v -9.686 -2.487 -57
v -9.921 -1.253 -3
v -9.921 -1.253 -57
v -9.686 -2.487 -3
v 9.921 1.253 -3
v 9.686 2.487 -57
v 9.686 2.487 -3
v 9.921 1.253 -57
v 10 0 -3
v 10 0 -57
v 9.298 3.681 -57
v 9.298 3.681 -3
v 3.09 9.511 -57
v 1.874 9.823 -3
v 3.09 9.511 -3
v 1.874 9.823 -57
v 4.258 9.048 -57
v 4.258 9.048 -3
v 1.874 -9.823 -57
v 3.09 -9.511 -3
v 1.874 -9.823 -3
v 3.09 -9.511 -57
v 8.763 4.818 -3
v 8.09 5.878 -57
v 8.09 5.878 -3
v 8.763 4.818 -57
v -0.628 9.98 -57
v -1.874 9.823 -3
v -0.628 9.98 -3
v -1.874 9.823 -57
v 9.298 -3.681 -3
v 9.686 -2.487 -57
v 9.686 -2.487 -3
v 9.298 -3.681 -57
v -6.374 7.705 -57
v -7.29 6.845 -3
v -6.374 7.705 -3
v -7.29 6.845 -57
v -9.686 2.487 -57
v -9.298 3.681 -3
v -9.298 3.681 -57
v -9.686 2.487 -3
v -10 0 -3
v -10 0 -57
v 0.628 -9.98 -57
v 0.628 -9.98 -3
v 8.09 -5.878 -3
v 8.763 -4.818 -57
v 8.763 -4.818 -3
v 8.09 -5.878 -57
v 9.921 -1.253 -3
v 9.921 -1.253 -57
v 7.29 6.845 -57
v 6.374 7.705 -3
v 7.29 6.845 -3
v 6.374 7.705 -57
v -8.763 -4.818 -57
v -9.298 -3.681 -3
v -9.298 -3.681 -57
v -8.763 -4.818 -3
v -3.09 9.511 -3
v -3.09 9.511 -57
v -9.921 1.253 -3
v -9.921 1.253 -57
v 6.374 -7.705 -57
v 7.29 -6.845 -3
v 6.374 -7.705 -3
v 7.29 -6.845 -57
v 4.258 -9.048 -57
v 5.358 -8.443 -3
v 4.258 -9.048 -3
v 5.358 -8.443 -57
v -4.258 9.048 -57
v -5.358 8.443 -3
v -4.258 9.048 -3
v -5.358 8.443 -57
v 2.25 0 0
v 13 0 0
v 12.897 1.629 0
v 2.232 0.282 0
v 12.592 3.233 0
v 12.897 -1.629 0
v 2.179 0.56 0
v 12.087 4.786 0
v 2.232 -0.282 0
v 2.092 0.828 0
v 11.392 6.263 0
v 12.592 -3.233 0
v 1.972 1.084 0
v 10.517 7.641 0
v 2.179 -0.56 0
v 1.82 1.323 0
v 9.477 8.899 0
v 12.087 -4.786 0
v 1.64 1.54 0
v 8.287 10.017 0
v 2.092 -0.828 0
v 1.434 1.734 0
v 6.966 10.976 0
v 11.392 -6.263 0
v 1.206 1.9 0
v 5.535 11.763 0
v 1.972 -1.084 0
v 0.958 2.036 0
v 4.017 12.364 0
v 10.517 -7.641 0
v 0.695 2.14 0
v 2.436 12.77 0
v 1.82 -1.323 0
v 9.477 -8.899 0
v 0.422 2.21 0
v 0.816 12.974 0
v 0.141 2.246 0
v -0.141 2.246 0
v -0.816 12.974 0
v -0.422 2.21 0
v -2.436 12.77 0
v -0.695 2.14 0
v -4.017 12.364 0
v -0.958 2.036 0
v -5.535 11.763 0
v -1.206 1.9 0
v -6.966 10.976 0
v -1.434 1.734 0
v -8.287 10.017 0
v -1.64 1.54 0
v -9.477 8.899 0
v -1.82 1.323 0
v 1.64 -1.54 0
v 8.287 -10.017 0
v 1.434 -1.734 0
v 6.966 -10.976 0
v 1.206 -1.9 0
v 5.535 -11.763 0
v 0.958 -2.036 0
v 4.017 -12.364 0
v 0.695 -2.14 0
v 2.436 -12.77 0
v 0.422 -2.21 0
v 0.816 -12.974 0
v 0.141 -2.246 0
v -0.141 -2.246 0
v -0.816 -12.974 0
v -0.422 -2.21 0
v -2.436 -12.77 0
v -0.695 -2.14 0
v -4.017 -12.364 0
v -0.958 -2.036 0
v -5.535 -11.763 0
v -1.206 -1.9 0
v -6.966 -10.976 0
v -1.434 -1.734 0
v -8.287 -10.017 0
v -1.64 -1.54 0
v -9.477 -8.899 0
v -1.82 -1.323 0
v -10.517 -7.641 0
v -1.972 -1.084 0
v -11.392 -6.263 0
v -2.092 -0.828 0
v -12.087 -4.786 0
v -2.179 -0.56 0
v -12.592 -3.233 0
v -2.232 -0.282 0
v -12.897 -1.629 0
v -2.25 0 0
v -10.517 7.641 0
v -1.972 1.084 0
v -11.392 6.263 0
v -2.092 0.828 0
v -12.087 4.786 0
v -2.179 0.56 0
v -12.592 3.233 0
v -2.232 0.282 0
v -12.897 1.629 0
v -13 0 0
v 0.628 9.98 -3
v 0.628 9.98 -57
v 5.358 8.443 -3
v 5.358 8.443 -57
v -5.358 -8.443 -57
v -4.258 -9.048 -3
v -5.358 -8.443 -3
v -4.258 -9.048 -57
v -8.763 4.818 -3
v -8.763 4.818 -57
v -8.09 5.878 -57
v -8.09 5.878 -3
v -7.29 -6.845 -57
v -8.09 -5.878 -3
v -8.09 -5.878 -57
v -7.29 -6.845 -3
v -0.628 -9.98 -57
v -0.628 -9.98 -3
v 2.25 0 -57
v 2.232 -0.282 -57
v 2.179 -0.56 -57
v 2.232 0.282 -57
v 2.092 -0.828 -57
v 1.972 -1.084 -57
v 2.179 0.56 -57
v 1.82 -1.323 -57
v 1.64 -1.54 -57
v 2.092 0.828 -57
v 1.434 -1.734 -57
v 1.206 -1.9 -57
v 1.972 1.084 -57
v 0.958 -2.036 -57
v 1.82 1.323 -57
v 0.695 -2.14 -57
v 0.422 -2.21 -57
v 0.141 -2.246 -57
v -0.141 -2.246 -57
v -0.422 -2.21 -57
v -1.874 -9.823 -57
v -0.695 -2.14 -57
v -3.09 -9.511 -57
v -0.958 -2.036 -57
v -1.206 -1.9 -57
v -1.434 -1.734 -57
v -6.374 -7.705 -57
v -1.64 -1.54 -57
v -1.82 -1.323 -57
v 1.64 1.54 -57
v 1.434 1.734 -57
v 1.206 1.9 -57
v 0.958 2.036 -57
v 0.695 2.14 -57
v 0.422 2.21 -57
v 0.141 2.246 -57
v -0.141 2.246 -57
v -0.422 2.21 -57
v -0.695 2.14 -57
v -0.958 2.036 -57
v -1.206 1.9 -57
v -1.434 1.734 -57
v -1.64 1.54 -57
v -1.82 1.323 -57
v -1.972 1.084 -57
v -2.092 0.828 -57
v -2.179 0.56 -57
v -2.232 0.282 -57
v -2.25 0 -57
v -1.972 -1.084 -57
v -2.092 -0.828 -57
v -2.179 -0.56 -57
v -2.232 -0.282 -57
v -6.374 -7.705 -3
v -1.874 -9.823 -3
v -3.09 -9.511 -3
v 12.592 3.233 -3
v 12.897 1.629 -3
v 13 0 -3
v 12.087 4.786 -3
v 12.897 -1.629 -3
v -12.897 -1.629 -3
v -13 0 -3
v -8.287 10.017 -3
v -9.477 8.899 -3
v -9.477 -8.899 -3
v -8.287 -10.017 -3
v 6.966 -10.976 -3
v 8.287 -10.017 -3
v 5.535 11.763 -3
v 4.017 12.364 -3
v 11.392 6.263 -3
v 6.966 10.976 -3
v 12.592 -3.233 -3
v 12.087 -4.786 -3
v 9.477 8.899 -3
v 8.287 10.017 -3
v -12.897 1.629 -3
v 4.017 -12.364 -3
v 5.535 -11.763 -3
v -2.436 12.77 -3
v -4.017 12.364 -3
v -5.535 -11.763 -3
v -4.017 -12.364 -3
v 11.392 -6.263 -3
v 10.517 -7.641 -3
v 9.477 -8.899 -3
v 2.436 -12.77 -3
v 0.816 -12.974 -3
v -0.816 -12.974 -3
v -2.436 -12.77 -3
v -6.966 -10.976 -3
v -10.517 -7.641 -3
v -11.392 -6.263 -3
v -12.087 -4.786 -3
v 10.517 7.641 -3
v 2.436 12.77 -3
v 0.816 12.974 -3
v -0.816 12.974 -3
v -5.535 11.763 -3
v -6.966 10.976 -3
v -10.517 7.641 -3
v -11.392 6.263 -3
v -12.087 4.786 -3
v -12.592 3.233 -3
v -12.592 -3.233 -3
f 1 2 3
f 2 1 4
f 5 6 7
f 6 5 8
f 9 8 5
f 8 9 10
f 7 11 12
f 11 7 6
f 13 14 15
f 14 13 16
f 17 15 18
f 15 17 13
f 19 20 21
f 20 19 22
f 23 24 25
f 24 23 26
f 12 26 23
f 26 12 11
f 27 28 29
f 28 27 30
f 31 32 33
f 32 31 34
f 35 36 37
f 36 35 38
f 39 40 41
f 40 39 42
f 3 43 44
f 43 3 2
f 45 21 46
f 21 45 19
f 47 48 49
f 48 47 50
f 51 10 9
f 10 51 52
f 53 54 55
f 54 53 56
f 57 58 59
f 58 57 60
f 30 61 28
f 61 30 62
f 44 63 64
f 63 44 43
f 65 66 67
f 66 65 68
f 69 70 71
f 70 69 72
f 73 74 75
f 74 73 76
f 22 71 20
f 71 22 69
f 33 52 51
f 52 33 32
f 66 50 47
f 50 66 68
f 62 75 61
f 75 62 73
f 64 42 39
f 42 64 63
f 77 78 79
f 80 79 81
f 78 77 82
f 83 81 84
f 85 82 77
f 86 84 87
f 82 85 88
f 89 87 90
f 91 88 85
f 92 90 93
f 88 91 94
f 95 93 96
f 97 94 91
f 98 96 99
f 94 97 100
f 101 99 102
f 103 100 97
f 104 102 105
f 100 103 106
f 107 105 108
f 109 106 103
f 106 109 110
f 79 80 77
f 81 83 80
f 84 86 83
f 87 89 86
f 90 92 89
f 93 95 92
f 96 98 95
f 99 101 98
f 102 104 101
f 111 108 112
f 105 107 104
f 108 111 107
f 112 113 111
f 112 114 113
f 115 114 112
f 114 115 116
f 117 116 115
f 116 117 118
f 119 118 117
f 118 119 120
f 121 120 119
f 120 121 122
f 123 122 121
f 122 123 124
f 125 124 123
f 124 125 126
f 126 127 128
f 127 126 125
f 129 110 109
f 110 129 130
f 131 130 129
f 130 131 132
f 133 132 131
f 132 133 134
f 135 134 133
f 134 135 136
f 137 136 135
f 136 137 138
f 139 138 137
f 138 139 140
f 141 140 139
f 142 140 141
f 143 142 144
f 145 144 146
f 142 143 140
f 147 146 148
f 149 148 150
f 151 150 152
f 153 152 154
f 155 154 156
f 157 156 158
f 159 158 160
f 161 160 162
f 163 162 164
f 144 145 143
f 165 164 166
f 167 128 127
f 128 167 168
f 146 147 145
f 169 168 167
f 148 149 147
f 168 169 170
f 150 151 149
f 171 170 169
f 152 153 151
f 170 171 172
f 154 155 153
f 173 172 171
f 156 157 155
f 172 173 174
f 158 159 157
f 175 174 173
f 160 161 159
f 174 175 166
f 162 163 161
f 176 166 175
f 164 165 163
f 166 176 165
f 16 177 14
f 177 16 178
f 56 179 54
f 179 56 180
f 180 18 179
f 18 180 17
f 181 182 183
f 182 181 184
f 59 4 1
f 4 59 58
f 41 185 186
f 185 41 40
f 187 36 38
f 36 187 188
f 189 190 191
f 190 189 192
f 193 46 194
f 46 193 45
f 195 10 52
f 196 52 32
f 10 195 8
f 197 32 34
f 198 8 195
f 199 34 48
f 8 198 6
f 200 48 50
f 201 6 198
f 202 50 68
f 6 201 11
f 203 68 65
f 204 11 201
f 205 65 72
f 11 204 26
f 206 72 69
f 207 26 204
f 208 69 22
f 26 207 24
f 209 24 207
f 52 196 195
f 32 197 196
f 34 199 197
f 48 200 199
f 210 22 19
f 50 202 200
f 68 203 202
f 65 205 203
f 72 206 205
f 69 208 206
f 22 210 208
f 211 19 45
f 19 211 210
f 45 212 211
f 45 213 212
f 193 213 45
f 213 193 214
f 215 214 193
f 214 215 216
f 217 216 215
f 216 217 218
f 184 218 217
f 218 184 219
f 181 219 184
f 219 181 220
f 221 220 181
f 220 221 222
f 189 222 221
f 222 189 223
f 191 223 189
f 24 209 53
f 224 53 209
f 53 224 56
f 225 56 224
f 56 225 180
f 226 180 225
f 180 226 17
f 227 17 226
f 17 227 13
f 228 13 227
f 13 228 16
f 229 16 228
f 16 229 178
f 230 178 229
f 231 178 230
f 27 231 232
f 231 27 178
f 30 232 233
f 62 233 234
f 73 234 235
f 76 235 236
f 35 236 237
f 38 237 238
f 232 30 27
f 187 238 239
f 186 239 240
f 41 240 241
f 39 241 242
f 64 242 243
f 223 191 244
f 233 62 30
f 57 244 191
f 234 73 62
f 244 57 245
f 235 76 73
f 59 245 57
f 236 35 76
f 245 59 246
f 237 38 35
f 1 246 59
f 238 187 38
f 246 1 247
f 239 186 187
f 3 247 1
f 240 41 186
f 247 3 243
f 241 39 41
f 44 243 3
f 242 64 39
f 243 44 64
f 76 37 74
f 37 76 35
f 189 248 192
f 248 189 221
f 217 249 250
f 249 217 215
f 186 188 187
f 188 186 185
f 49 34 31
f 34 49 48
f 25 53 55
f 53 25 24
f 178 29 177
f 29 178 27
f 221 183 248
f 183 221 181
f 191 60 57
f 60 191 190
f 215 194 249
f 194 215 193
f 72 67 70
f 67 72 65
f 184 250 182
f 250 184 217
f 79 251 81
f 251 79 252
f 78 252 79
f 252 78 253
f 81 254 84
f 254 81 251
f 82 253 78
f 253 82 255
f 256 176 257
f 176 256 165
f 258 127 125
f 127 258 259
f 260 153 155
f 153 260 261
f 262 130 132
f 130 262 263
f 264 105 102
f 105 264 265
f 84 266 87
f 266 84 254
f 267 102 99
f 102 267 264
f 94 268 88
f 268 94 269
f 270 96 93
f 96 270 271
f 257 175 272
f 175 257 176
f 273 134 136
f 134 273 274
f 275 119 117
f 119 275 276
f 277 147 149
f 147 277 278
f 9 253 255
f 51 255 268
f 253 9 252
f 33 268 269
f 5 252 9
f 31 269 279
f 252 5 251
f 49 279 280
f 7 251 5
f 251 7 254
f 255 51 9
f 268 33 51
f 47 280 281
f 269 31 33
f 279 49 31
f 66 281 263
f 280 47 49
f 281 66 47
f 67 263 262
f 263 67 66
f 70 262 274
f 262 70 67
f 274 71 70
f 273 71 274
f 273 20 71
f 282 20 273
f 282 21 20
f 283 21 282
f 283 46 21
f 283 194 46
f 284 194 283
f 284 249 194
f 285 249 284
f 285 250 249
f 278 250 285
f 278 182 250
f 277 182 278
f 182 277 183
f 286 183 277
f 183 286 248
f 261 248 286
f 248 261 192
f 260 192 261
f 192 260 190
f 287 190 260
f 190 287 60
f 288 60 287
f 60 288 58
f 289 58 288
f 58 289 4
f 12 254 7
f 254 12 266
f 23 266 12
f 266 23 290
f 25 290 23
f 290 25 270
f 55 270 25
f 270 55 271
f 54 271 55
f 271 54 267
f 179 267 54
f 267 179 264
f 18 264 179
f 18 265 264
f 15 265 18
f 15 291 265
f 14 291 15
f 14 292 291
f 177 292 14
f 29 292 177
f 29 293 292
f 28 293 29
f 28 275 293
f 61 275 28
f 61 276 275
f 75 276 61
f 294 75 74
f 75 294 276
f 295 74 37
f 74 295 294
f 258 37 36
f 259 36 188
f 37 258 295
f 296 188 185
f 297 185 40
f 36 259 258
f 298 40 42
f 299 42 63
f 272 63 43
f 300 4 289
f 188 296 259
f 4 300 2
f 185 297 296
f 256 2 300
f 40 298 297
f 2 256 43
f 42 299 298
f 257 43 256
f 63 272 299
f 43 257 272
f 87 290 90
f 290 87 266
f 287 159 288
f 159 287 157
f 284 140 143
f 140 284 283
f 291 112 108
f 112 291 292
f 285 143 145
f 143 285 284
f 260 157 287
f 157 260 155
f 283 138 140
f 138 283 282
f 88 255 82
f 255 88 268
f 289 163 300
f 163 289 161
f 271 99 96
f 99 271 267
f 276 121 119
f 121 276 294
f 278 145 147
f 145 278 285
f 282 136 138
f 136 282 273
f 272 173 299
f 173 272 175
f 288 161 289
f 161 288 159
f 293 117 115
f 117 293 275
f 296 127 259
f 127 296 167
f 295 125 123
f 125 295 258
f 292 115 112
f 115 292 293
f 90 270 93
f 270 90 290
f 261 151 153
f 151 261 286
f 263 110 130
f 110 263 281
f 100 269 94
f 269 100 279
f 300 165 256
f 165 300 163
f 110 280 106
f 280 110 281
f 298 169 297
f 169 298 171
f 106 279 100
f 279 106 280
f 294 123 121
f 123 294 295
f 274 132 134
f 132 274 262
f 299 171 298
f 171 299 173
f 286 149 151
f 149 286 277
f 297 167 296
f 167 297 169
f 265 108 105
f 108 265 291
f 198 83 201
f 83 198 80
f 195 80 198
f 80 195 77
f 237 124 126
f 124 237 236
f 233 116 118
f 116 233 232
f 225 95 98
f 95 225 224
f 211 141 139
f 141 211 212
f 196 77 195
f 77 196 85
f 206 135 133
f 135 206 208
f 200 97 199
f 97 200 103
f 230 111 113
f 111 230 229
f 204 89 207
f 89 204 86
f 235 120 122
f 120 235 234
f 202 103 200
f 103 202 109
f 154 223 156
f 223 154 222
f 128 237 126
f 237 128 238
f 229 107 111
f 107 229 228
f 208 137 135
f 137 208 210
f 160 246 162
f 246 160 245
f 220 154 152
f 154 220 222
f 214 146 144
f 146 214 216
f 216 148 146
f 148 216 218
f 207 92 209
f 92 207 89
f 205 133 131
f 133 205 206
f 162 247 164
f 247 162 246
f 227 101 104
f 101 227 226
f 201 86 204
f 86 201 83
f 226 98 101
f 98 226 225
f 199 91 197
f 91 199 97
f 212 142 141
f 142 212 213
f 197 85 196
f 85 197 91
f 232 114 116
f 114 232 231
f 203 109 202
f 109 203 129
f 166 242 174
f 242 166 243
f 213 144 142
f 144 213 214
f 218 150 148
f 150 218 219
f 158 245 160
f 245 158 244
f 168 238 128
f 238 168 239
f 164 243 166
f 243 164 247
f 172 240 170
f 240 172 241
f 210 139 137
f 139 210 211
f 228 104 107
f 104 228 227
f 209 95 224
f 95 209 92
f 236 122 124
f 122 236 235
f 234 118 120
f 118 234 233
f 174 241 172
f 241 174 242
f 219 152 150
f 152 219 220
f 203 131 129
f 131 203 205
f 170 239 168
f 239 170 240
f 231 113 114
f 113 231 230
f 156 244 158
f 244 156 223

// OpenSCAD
$fn = 50;


difference() {
	union() {
		translate(v = [0, 0, -57.0000000000]) {
			cylinder(h = 57, r = 10.0000000000);
		}
		translate(v = [0, 0, -3.0000000000]) {
			cylinder(h = 3, r = 13.0000000000);
		}
	}
	union() {
		#translate(v = [0, 0, -57]) {
			cylinder(h = 57, r = 2.2500000000);
		}
	}
}
